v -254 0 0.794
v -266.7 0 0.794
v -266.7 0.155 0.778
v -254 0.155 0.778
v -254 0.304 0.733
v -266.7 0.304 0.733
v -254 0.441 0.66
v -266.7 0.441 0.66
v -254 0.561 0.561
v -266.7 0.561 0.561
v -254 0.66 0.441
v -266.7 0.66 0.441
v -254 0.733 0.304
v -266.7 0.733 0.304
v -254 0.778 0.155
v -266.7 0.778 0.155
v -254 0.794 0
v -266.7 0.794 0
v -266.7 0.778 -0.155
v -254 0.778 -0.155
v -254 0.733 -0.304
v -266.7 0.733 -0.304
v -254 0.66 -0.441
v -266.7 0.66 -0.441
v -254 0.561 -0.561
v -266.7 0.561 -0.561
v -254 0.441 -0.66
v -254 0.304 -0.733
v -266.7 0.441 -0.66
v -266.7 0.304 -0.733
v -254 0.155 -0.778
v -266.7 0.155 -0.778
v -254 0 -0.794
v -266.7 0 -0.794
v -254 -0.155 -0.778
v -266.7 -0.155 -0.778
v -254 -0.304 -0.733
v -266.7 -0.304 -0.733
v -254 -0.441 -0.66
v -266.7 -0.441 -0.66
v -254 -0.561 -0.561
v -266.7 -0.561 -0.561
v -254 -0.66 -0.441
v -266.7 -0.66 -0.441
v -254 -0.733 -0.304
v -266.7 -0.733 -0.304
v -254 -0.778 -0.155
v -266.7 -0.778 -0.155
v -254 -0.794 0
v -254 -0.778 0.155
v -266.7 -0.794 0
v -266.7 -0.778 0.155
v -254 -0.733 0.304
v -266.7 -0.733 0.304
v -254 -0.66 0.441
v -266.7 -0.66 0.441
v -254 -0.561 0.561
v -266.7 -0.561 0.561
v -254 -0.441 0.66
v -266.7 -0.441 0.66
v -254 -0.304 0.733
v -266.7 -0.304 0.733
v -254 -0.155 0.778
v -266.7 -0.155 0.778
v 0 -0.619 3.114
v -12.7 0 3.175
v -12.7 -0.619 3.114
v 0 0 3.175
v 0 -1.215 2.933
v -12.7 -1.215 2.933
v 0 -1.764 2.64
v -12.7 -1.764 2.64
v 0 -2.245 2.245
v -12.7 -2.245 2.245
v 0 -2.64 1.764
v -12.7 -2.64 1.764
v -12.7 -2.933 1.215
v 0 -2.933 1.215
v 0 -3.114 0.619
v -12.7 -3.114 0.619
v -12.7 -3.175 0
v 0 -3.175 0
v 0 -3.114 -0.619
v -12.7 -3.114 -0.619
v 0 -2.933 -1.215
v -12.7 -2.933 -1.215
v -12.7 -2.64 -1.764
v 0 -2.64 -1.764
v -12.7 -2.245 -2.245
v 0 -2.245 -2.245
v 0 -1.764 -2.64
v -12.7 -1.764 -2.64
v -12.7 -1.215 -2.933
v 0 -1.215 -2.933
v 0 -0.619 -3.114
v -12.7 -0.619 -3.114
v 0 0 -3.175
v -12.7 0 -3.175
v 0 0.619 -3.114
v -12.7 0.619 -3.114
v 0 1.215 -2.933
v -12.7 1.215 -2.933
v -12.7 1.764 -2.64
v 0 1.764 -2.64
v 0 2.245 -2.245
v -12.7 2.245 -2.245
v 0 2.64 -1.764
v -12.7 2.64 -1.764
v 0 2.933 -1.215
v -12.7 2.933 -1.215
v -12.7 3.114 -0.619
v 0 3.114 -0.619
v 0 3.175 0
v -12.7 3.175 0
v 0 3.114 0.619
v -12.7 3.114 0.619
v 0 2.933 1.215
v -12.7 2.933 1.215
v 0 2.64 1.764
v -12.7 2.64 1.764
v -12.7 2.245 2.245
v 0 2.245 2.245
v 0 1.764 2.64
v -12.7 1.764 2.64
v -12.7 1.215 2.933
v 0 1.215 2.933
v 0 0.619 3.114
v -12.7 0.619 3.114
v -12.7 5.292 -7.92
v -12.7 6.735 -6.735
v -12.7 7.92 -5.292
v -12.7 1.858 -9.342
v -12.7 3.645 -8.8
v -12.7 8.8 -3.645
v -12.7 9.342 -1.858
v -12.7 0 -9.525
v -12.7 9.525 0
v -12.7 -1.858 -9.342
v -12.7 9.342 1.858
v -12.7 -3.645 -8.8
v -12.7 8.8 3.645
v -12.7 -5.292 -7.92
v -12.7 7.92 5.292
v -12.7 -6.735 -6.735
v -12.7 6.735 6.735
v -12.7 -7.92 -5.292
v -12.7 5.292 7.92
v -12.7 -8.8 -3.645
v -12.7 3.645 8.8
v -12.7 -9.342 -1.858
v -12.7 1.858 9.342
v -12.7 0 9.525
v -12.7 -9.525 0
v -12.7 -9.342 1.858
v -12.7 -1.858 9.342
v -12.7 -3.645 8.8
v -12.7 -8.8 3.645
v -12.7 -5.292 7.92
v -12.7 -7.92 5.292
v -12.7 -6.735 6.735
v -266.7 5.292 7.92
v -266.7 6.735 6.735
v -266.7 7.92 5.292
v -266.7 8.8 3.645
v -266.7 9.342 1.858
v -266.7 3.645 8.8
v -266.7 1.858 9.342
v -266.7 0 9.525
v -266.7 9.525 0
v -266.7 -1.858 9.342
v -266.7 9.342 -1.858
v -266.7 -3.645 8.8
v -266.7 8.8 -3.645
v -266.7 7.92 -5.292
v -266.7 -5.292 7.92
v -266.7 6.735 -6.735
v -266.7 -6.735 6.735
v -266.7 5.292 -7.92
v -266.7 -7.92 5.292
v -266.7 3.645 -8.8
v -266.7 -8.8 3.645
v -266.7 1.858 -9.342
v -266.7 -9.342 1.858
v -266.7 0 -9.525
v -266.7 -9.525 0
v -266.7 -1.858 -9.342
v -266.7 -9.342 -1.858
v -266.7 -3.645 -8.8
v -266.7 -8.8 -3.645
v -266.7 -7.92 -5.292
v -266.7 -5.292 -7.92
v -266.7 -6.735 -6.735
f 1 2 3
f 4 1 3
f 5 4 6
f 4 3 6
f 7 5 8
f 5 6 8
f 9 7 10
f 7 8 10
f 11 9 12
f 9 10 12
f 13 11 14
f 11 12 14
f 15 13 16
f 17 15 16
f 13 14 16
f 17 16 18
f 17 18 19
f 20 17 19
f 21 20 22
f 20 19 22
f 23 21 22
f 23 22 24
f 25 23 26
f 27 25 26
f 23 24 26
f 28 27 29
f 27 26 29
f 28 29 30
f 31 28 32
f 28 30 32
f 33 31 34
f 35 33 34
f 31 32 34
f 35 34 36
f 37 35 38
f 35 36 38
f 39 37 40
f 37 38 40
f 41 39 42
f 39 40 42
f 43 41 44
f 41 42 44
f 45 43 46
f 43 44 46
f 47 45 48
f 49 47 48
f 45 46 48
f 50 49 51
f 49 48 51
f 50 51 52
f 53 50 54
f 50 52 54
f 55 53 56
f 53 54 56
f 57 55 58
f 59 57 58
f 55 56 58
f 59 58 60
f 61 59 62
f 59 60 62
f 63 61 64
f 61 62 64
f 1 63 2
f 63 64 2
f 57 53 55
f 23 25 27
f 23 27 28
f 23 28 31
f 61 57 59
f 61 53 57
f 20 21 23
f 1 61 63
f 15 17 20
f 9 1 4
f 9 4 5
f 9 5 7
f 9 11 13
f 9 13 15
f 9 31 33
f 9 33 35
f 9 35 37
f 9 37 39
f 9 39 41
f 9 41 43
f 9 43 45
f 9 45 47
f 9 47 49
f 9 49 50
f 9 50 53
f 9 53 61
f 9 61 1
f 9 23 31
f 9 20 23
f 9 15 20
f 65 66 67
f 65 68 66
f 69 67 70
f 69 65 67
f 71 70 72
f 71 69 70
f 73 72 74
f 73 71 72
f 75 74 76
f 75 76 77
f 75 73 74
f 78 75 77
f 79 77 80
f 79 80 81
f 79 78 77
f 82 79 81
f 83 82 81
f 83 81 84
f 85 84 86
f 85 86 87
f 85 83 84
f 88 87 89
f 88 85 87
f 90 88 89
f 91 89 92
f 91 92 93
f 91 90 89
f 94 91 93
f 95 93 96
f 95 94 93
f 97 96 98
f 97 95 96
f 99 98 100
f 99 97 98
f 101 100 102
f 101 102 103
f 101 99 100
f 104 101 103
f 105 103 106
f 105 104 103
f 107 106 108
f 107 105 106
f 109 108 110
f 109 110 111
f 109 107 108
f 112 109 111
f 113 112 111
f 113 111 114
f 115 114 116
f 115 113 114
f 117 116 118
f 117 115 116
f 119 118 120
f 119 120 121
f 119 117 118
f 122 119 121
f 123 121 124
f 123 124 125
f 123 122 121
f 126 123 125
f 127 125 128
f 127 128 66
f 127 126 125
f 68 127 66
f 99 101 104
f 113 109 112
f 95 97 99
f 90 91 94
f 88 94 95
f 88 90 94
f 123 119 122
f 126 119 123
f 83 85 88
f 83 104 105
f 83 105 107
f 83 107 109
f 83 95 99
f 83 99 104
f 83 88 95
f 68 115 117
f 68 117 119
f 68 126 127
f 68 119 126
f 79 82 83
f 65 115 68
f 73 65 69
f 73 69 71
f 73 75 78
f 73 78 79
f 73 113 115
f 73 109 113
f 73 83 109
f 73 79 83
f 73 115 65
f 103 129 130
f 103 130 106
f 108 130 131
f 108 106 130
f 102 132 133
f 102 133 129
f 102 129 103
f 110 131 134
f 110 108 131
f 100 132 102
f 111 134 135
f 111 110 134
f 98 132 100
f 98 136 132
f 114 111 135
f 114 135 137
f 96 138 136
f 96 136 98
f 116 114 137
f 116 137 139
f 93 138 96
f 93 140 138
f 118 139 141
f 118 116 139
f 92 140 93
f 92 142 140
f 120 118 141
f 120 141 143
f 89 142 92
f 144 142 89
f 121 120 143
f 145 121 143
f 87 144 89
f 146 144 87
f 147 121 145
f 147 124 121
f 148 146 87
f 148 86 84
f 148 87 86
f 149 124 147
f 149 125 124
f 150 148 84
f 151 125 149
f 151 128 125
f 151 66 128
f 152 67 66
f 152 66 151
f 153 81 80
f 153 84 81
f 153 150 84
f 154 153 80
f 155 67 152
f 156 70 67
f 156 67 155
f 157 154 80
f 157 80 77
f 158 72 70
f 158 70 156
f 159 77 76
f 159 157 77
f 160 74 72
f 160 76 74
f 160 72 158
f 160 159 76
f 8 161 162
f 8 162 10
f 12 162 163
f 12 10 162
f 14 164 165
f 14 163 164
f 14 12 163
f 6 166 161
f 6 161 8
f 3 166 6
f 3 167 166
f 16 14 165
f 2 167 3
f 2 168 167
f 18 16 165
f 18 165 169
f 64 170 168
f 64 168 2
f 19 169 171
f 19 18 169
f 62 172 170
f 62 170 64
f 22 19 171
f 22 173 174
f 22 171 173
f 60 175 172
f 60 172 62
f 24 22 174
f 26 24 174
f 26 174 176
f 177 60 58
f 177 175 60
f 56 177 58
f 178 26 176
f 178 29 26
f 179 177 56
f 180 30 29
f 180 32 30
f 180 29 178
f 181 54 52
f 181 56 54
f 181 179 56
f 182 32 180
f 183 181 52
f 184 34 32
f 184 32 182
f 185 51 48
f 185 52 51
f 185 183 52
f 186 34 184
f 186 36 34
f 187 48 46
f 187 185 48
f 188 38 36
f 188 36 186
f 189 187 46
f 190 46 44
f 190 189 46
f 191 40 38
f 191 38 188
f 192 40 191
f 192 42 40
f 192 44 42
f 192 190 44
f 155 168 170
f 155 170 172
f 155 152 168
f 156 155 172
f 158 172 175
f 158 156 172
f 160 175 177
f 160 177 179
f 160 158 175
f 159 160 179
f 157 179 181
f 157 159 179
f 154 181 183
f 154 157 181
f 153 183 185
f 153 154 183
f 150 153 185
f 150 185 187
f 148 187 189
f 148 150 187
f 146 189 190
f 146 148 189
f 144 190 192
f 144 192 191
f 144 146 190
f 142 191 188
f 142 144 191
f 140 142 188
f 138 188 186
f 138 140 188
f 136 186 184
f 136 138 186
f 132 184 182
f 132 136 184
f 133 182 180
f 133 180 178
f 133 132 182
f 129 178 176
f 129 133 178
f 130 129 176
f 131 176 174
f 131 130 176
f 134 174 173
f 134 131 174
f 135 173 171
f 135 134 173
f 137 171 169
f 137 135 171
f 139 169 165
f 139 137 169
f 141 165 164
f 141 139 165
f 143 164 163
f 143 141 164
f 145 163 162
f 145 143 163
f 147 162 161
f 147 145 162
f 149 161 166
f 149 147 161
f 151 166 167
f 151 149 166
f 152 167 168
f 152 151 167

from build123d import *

# Parameters (mm, degrees)
SKETCH2_R          = 0.79375
CUT_EXTRUDE1_DEPTH = 12.7


with BuildPart() as part:
    # Sketch1 → Revolve1 (revolve)
    with BuildSketch(Plane.XY, mode=Mode.PRIVATE) as revolve1_sk:
        Polygon((-266.7, 0), (-266.7, 9.525), (-12.7, 9.525), (-12.7, 3.175), (0, 3.175), (0, 0), align=None)
    revolve(revolve1_sk.sketch.rotate(Axis((-54.16626506, 0, 0), (1, 0, 0)), 90), axis=Axis((-54.16626506, 0, 0), (1, 0, 0)))

    # Sketch2 → Cut-Extrude1 (cut)
    with BuildSketch(Plane.ZY.offset(266.7)):
        Circle(SKETCH2_R)
    extrude(amount=-CUT_EXTRUDE1_DEPTH, mode=Mode.SUBTRACT)


solid = part.part
